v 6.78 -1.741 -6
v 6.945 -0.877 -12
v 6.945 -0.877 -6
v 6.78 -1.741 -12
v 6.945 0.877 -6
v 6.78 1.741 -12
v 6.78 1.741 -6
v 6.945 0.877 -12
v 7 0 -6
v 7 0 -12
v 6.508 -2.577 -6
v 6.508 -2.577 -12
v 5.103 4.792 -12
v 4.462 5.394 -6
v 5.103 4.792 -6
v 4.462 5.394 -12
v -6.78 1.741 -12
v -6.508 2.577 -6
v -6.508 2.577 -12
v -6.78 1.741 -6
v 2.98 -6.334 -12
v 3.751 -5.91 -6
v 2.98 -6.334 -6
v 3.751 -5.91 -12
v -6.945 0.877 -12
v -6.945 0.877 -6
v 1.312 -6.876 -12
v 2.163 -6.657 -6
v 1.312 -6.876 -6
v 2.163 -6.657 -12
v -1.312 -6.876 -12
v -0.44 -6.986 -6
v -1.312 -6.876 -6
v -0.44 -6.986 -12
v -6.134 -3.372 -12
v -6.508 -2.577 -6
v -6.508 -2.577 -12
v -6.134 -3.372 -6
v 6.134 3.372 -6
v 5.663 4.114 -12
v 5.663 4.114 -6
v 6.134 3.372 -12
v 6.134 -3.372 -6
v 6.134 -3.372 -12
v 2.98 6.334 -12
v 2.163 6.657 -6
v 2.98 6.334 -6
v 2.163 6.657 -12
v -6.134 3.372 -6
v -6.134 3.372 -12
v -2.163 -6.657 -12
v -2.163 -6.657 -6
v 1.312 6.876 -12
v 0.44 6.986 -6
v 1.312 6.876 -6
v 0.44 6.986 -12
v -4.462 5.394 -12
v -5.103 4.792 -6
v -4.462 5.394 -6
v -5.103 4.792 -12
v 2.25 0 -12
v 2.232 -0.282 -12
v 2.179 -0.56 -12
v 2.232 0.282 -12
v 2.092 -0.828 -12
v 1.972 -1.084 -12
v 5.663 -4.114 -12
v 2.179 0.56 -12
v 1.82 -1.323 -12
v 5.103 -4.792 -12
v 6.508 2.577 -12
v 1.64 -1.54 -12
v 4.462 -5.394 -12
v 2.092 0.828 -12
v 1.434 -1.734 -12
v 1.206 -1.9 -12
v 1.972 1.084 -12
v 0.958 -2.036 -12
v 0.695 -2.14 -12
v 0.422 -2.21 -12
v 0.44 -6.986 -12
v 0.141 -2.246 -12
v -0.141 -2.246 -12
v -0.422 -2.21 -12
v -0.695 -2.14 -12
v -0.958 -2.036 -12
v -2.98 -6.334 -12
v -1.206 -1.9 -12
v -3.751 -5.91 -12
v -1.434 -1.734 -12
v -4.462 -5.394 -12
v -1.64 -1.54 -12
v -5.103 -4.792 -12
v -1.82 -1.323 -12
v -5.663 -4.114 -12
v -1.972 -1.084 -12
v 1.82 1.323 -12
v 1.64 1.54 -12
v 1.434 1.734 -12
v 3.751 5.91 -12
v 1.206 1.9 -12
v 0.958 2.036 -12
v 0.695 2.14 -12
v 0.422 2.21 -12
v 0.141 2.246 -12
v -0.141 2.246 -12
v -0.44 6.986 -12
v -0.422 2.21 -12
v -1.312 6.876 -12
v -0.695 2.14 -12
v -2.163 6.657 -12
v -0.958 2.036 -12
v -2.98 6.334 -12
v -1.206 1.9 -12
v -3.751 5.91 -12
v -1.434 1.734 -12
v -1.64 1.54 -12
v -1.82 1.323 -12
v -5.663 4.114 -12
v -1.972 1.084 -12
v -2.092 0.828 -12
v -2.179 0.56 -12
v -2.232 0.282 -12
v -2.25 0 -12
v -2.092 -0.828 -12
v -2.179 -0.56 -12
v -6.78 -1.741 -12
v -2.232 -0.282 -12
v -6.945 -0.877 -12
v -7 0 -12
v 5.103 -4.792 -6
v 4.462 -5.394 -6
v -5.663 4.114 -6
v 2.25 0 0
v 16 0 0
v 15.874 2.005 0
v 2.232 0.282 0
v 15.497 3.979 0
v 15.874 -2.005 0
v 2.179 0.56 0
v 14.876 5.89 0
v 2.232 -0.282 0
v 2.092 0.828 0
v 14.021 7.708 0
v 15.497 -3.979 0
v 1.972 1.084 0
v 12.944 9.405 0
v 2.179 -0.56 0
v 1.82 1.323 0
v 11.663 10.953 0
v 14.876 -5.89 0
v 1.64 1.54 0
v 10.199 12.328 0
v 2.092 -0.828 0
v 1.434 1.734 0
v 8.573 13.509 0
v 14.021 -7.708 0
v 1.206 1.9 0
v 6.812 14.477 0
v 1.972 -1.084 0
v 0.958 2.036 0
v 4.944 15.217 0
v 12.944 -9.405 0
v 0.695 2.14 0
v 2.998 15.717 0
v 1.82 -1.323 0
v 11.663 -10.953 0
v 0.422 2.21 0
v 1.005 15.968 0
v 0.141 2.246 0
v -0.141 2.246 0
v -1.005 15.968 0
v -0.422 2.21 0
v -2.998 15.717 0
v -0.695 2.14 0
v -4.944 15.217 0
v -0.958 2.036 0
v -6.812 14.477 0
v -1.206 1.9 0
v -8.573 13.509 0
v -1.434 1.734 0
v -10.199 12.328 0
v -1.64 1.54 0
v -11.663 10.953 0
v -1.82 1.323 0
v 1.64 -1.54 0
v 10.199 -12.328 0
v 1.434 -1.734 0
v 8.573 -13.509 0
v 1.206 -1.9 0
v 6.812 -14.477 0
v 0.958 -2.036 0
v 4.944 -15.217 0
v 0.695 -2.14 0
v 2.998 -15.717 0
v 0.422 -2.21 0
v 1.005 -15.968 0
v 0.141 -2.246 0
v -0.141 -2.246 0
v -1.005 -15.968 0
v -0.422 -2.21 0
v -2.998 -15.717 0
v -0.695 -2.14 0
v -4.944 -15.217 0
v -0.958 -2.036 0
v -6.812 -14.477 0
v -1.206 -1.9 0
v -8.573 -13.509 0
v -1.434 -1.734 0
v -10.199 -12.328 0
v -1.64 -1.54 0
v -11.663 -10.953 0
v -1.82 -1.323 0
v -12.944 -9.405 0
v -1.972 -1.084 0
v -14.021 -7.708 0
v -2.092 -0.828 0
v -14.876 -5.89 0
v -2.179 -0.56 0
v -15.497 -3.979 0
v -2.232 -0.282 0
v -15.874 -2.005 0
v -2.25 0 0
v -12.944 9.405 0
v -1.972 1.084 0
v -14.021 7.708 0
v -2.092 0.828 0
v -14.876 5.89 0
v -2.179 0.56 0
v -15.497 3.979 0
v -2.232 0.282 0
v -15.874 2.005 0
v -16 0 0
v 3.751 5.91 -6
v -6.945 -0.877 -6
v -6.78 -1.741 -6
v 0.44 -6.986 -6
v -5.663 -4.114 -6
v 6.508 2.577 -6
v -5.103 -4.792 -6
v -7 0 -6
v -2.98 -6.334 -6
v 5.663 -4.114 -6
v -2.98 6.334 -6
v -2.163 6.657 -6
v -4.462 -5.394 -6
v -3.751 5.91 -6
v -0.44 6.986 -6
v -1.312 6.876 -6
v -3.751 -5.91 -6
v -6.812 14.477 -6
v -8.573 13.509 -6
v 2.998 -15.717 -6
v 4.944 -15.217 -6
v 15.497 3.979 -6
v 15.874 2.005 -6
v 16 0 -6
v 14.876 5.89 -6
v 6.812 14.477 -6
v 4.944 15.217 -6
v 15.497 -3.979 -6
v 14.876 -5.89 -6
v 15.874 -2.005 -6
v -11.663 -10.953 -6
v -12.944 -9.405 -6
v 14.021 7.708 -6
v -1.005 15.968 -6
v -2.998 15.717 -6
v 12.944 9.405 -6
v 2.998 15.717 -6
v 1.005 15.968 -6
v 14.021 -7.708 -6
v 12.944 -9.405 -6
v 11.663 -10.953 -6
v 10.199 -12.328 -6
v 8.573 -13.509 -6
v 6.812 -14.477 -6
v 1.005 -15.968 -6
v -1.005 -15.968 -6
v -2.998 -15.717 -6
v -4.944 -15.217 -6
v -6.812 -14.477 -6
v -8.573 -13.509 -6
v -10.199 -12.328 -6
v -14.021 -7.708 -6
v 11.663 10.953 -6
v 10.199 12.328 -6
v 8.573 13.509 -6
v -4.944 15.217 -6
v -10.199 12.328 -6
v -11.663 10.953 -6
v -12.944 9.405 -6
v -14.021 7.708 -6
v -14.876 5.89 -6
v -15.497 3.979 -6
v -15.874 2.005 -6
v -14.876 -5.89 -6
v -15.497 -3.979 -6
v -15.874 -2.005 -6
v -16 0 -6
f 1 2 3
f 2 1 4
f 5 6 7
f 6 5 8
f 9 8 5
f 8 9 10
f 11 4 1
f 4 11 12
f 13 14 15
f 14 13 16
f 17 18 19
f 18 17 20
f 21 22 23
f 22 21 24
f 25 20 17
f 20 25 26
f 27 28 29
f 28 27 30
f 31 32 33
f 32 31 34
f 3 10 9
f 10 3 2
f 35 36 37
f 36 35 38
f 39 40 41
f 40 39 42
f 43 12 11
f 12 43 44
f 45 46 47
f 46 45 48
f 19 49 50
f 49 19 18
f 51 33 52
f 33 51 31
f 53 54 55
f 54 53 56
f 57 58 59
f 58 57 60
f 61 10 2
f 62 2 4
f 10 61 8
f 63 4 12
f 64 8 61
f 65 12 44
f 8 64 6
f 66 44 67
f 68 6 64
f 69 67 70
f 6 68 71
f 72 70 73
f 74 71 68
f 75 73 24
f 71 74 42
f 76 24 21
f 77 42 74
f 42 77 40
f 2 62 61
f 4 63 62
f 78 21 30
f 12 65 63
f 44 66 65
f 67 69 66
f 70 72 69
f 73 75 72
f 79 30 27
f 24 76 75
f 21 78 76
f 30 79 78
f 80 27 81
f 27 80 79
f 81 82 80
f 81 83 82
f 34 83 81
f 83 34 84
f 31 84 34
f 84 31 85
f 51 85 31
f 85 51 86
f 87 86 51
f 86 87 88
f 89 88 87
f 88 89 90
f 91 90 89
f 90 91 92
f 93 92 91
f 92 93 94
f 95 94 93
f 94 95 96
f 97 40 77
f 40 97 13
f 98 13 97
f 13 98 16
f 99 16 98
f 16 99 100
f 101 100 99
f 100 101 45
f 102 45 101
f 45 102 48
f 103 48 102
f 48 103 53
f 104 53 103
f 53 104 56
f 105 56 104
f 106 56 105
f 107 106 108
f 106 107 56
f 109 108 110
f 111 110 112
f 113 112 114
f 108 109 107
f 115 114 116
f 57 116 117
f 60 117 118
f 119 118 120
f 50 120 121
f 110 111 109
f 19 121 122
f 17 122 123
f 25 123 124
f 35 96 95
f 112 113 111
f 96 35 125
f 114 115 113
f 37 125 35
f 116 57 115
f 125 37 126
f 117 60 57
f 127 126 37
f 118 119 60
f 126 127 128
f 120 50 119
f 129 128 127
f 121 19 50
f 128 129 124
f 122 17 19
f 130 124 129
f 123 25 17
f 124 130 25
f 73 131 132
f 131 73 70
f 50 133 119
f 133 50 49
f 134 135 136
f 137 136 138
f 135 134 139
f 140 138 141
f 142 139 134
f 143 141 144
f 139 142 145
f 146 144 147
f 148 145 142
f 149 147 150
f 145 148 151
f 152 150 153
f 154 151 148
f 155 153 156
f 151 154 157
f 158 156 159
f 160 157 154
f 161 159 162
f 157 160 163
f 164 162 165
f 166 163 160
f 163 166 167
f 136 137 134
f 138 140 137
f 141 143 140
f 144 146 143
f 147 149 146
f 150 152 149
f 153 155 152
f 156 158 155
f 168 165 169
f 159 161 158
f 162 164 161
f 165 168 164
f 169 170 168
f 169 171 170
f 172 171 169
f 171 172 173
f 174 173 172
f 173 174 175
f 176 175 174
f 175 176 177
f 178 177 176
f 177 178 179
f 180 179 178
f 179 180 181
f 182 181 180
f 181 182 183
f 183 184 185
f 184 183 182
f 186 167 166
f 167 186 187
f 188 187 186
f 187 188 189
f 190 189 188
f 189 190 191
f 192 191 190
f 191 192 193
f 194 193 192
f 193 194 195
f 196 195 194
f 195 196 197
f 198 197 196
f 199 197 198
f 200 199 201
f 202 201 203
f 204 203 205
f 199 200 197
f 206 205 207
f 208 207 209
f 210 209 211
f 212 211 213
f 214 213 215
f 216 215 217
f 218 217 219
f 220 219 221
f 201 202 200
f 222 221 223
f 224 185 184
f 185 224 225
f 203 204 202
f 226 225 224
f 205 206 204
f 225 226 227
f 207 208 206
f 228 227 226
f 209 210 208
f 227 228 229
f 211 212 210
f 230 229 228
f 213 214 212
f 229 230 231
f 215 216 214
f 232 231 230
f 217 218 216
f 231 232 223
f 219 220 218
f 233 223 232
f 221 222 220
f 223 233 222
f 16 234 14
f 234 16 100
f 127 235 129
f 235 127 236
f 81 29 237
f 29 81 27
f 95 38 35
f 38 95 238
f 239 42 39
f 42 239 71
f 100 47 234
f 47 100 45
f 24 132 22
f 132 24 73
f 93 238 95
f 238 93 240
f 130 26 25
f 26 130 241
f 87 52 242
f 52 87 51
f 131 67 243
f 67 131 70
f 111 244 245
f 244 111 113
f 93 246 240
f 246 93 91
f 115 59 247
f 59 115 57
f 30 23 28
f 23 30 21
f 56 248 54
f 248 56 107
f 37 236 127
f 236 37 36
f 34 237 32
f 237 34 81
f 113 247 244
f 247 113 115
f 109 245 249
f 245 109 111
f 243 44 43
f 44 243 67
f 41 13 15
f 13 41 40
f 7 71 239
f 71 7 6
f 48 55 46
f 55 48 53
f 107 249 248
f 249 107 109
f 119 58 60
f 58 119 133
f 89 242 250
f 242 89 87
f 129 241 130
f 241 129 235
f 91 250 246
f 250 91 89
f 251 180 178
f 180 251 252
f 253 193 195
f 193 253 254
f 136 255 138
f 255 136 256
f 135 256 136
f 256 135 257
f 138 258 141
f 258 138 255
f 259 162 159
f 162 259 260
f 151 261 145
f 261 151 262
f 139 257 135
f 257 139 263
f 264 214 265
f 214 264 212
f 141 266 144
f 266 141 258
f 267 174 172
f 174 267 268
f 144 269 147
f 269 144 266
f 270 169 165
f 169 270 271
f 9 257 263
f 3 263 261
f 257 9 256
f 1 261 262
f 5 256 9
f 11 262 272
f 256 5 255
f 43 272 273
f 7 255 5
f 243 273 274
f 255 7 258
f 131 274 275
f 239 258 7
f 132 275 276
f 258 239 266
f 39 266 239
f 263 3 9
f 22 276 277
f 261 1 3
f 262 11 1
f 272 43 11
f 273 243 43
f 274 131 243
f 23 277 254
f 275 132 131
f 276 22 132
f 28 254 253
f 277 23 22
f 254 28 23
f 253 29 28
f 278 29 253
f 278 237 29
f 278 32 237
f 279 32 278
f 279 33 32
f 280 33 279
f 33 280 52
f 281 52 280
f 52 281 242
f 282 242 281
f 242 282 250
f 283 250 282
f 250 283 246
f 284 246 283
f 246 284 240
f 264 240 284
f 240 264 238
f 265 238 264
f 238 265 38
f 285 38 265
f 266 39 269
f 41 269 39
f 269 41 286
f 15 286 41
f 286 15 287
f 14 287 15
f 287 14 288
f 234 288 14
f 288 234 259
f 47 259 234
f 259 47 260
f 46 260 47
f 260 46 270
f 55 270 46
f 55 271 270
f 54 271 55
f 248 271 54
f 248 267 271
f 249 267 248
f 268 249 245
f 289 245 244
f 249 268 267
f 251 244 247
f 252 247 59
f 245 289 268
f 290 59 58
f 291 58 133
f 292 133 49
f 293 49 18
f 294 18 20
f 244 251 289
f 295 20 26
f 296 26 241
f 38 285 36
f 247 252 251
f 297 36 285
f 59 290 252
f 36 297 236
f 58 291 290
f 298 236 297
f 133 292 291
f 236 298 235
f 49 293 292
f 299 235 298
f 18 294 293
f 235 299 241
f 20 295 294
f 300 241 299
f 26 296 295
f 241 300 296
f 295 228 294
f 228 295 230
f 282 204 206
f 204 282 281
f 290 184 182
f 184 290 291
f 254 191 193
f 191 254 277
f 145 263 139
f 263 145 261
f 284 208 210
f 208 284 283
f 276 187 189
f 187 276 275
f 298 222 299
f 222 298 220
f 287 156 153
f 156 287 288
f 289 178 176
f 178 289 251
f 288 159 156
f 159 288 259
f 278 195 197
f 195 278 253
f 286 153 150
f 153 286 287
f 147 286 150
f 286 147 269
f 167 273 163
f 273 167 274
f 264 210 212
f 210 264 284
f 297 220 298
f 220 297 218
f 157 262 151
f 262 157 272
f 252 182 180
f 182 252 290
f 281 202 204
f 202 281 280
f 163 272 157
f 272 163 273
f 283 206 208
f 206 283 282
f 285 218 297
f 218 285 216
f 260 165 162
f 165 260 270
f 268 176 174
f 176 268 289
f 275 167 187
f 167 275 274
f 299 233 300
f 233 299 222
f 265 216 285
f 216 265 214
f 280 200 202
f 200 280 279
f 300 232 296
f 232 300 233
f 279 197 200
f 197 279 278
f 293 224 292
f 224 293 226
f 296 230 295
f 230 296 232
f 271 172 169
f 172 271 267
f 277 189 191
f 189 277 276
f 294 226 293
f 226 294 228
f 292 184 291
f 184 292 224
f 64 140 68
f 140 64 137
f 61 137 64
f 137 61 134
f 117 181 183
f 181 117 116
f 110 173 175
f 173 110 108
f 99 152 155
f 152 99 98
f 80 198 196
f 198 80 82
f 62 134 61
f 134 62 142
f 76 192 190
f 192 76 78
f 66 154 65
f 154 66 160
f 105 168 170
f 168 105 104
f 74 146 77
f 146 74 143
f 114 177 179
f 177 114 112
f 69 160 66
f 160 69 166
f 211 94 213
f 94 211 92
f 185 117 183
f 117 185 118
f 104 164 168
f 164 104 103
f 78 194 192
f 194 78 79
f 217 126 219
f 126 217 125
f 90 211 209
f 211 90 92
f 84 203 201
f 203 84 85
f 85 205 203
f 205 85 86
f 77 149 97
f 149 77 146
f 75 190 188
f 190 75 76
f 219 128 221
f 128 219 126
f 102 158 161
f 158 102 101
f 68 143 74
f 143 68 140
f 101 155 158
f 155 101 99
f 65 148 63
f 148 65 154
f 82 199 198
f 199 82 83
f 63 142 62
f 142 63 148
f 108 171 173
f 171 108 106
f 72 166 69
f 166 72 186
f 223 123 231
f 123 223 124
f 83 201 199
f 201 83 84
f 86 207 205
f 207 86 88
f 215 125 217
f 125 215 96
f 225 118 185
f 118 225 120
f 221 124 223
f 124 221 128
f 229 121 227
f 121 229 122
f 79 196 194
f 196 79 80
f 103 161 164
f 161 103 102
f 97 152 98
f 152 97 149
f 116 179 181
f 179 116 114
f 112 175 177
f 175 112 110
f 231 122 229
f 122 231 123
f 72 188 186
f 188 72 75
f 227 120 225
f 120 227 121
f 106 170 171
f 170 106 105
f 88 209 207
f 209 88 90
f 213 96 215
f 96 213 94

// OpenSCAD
$fn = 50;


difference() {
	union() {
		translate(v = [0, 0, -12.0000000000]) {
			cylinder(h = 12, r = 7.0000000000);
		}
		translate(v = [0, 0, -6.0000000000]) {
			cylinder(h = 6, r = 16.0000000000);
		}
	}
	union() {
		#translate(v = [0, 0, -12]) {
			cylinder(h = 12, r = 2.2500000000);
		}
	}
}
